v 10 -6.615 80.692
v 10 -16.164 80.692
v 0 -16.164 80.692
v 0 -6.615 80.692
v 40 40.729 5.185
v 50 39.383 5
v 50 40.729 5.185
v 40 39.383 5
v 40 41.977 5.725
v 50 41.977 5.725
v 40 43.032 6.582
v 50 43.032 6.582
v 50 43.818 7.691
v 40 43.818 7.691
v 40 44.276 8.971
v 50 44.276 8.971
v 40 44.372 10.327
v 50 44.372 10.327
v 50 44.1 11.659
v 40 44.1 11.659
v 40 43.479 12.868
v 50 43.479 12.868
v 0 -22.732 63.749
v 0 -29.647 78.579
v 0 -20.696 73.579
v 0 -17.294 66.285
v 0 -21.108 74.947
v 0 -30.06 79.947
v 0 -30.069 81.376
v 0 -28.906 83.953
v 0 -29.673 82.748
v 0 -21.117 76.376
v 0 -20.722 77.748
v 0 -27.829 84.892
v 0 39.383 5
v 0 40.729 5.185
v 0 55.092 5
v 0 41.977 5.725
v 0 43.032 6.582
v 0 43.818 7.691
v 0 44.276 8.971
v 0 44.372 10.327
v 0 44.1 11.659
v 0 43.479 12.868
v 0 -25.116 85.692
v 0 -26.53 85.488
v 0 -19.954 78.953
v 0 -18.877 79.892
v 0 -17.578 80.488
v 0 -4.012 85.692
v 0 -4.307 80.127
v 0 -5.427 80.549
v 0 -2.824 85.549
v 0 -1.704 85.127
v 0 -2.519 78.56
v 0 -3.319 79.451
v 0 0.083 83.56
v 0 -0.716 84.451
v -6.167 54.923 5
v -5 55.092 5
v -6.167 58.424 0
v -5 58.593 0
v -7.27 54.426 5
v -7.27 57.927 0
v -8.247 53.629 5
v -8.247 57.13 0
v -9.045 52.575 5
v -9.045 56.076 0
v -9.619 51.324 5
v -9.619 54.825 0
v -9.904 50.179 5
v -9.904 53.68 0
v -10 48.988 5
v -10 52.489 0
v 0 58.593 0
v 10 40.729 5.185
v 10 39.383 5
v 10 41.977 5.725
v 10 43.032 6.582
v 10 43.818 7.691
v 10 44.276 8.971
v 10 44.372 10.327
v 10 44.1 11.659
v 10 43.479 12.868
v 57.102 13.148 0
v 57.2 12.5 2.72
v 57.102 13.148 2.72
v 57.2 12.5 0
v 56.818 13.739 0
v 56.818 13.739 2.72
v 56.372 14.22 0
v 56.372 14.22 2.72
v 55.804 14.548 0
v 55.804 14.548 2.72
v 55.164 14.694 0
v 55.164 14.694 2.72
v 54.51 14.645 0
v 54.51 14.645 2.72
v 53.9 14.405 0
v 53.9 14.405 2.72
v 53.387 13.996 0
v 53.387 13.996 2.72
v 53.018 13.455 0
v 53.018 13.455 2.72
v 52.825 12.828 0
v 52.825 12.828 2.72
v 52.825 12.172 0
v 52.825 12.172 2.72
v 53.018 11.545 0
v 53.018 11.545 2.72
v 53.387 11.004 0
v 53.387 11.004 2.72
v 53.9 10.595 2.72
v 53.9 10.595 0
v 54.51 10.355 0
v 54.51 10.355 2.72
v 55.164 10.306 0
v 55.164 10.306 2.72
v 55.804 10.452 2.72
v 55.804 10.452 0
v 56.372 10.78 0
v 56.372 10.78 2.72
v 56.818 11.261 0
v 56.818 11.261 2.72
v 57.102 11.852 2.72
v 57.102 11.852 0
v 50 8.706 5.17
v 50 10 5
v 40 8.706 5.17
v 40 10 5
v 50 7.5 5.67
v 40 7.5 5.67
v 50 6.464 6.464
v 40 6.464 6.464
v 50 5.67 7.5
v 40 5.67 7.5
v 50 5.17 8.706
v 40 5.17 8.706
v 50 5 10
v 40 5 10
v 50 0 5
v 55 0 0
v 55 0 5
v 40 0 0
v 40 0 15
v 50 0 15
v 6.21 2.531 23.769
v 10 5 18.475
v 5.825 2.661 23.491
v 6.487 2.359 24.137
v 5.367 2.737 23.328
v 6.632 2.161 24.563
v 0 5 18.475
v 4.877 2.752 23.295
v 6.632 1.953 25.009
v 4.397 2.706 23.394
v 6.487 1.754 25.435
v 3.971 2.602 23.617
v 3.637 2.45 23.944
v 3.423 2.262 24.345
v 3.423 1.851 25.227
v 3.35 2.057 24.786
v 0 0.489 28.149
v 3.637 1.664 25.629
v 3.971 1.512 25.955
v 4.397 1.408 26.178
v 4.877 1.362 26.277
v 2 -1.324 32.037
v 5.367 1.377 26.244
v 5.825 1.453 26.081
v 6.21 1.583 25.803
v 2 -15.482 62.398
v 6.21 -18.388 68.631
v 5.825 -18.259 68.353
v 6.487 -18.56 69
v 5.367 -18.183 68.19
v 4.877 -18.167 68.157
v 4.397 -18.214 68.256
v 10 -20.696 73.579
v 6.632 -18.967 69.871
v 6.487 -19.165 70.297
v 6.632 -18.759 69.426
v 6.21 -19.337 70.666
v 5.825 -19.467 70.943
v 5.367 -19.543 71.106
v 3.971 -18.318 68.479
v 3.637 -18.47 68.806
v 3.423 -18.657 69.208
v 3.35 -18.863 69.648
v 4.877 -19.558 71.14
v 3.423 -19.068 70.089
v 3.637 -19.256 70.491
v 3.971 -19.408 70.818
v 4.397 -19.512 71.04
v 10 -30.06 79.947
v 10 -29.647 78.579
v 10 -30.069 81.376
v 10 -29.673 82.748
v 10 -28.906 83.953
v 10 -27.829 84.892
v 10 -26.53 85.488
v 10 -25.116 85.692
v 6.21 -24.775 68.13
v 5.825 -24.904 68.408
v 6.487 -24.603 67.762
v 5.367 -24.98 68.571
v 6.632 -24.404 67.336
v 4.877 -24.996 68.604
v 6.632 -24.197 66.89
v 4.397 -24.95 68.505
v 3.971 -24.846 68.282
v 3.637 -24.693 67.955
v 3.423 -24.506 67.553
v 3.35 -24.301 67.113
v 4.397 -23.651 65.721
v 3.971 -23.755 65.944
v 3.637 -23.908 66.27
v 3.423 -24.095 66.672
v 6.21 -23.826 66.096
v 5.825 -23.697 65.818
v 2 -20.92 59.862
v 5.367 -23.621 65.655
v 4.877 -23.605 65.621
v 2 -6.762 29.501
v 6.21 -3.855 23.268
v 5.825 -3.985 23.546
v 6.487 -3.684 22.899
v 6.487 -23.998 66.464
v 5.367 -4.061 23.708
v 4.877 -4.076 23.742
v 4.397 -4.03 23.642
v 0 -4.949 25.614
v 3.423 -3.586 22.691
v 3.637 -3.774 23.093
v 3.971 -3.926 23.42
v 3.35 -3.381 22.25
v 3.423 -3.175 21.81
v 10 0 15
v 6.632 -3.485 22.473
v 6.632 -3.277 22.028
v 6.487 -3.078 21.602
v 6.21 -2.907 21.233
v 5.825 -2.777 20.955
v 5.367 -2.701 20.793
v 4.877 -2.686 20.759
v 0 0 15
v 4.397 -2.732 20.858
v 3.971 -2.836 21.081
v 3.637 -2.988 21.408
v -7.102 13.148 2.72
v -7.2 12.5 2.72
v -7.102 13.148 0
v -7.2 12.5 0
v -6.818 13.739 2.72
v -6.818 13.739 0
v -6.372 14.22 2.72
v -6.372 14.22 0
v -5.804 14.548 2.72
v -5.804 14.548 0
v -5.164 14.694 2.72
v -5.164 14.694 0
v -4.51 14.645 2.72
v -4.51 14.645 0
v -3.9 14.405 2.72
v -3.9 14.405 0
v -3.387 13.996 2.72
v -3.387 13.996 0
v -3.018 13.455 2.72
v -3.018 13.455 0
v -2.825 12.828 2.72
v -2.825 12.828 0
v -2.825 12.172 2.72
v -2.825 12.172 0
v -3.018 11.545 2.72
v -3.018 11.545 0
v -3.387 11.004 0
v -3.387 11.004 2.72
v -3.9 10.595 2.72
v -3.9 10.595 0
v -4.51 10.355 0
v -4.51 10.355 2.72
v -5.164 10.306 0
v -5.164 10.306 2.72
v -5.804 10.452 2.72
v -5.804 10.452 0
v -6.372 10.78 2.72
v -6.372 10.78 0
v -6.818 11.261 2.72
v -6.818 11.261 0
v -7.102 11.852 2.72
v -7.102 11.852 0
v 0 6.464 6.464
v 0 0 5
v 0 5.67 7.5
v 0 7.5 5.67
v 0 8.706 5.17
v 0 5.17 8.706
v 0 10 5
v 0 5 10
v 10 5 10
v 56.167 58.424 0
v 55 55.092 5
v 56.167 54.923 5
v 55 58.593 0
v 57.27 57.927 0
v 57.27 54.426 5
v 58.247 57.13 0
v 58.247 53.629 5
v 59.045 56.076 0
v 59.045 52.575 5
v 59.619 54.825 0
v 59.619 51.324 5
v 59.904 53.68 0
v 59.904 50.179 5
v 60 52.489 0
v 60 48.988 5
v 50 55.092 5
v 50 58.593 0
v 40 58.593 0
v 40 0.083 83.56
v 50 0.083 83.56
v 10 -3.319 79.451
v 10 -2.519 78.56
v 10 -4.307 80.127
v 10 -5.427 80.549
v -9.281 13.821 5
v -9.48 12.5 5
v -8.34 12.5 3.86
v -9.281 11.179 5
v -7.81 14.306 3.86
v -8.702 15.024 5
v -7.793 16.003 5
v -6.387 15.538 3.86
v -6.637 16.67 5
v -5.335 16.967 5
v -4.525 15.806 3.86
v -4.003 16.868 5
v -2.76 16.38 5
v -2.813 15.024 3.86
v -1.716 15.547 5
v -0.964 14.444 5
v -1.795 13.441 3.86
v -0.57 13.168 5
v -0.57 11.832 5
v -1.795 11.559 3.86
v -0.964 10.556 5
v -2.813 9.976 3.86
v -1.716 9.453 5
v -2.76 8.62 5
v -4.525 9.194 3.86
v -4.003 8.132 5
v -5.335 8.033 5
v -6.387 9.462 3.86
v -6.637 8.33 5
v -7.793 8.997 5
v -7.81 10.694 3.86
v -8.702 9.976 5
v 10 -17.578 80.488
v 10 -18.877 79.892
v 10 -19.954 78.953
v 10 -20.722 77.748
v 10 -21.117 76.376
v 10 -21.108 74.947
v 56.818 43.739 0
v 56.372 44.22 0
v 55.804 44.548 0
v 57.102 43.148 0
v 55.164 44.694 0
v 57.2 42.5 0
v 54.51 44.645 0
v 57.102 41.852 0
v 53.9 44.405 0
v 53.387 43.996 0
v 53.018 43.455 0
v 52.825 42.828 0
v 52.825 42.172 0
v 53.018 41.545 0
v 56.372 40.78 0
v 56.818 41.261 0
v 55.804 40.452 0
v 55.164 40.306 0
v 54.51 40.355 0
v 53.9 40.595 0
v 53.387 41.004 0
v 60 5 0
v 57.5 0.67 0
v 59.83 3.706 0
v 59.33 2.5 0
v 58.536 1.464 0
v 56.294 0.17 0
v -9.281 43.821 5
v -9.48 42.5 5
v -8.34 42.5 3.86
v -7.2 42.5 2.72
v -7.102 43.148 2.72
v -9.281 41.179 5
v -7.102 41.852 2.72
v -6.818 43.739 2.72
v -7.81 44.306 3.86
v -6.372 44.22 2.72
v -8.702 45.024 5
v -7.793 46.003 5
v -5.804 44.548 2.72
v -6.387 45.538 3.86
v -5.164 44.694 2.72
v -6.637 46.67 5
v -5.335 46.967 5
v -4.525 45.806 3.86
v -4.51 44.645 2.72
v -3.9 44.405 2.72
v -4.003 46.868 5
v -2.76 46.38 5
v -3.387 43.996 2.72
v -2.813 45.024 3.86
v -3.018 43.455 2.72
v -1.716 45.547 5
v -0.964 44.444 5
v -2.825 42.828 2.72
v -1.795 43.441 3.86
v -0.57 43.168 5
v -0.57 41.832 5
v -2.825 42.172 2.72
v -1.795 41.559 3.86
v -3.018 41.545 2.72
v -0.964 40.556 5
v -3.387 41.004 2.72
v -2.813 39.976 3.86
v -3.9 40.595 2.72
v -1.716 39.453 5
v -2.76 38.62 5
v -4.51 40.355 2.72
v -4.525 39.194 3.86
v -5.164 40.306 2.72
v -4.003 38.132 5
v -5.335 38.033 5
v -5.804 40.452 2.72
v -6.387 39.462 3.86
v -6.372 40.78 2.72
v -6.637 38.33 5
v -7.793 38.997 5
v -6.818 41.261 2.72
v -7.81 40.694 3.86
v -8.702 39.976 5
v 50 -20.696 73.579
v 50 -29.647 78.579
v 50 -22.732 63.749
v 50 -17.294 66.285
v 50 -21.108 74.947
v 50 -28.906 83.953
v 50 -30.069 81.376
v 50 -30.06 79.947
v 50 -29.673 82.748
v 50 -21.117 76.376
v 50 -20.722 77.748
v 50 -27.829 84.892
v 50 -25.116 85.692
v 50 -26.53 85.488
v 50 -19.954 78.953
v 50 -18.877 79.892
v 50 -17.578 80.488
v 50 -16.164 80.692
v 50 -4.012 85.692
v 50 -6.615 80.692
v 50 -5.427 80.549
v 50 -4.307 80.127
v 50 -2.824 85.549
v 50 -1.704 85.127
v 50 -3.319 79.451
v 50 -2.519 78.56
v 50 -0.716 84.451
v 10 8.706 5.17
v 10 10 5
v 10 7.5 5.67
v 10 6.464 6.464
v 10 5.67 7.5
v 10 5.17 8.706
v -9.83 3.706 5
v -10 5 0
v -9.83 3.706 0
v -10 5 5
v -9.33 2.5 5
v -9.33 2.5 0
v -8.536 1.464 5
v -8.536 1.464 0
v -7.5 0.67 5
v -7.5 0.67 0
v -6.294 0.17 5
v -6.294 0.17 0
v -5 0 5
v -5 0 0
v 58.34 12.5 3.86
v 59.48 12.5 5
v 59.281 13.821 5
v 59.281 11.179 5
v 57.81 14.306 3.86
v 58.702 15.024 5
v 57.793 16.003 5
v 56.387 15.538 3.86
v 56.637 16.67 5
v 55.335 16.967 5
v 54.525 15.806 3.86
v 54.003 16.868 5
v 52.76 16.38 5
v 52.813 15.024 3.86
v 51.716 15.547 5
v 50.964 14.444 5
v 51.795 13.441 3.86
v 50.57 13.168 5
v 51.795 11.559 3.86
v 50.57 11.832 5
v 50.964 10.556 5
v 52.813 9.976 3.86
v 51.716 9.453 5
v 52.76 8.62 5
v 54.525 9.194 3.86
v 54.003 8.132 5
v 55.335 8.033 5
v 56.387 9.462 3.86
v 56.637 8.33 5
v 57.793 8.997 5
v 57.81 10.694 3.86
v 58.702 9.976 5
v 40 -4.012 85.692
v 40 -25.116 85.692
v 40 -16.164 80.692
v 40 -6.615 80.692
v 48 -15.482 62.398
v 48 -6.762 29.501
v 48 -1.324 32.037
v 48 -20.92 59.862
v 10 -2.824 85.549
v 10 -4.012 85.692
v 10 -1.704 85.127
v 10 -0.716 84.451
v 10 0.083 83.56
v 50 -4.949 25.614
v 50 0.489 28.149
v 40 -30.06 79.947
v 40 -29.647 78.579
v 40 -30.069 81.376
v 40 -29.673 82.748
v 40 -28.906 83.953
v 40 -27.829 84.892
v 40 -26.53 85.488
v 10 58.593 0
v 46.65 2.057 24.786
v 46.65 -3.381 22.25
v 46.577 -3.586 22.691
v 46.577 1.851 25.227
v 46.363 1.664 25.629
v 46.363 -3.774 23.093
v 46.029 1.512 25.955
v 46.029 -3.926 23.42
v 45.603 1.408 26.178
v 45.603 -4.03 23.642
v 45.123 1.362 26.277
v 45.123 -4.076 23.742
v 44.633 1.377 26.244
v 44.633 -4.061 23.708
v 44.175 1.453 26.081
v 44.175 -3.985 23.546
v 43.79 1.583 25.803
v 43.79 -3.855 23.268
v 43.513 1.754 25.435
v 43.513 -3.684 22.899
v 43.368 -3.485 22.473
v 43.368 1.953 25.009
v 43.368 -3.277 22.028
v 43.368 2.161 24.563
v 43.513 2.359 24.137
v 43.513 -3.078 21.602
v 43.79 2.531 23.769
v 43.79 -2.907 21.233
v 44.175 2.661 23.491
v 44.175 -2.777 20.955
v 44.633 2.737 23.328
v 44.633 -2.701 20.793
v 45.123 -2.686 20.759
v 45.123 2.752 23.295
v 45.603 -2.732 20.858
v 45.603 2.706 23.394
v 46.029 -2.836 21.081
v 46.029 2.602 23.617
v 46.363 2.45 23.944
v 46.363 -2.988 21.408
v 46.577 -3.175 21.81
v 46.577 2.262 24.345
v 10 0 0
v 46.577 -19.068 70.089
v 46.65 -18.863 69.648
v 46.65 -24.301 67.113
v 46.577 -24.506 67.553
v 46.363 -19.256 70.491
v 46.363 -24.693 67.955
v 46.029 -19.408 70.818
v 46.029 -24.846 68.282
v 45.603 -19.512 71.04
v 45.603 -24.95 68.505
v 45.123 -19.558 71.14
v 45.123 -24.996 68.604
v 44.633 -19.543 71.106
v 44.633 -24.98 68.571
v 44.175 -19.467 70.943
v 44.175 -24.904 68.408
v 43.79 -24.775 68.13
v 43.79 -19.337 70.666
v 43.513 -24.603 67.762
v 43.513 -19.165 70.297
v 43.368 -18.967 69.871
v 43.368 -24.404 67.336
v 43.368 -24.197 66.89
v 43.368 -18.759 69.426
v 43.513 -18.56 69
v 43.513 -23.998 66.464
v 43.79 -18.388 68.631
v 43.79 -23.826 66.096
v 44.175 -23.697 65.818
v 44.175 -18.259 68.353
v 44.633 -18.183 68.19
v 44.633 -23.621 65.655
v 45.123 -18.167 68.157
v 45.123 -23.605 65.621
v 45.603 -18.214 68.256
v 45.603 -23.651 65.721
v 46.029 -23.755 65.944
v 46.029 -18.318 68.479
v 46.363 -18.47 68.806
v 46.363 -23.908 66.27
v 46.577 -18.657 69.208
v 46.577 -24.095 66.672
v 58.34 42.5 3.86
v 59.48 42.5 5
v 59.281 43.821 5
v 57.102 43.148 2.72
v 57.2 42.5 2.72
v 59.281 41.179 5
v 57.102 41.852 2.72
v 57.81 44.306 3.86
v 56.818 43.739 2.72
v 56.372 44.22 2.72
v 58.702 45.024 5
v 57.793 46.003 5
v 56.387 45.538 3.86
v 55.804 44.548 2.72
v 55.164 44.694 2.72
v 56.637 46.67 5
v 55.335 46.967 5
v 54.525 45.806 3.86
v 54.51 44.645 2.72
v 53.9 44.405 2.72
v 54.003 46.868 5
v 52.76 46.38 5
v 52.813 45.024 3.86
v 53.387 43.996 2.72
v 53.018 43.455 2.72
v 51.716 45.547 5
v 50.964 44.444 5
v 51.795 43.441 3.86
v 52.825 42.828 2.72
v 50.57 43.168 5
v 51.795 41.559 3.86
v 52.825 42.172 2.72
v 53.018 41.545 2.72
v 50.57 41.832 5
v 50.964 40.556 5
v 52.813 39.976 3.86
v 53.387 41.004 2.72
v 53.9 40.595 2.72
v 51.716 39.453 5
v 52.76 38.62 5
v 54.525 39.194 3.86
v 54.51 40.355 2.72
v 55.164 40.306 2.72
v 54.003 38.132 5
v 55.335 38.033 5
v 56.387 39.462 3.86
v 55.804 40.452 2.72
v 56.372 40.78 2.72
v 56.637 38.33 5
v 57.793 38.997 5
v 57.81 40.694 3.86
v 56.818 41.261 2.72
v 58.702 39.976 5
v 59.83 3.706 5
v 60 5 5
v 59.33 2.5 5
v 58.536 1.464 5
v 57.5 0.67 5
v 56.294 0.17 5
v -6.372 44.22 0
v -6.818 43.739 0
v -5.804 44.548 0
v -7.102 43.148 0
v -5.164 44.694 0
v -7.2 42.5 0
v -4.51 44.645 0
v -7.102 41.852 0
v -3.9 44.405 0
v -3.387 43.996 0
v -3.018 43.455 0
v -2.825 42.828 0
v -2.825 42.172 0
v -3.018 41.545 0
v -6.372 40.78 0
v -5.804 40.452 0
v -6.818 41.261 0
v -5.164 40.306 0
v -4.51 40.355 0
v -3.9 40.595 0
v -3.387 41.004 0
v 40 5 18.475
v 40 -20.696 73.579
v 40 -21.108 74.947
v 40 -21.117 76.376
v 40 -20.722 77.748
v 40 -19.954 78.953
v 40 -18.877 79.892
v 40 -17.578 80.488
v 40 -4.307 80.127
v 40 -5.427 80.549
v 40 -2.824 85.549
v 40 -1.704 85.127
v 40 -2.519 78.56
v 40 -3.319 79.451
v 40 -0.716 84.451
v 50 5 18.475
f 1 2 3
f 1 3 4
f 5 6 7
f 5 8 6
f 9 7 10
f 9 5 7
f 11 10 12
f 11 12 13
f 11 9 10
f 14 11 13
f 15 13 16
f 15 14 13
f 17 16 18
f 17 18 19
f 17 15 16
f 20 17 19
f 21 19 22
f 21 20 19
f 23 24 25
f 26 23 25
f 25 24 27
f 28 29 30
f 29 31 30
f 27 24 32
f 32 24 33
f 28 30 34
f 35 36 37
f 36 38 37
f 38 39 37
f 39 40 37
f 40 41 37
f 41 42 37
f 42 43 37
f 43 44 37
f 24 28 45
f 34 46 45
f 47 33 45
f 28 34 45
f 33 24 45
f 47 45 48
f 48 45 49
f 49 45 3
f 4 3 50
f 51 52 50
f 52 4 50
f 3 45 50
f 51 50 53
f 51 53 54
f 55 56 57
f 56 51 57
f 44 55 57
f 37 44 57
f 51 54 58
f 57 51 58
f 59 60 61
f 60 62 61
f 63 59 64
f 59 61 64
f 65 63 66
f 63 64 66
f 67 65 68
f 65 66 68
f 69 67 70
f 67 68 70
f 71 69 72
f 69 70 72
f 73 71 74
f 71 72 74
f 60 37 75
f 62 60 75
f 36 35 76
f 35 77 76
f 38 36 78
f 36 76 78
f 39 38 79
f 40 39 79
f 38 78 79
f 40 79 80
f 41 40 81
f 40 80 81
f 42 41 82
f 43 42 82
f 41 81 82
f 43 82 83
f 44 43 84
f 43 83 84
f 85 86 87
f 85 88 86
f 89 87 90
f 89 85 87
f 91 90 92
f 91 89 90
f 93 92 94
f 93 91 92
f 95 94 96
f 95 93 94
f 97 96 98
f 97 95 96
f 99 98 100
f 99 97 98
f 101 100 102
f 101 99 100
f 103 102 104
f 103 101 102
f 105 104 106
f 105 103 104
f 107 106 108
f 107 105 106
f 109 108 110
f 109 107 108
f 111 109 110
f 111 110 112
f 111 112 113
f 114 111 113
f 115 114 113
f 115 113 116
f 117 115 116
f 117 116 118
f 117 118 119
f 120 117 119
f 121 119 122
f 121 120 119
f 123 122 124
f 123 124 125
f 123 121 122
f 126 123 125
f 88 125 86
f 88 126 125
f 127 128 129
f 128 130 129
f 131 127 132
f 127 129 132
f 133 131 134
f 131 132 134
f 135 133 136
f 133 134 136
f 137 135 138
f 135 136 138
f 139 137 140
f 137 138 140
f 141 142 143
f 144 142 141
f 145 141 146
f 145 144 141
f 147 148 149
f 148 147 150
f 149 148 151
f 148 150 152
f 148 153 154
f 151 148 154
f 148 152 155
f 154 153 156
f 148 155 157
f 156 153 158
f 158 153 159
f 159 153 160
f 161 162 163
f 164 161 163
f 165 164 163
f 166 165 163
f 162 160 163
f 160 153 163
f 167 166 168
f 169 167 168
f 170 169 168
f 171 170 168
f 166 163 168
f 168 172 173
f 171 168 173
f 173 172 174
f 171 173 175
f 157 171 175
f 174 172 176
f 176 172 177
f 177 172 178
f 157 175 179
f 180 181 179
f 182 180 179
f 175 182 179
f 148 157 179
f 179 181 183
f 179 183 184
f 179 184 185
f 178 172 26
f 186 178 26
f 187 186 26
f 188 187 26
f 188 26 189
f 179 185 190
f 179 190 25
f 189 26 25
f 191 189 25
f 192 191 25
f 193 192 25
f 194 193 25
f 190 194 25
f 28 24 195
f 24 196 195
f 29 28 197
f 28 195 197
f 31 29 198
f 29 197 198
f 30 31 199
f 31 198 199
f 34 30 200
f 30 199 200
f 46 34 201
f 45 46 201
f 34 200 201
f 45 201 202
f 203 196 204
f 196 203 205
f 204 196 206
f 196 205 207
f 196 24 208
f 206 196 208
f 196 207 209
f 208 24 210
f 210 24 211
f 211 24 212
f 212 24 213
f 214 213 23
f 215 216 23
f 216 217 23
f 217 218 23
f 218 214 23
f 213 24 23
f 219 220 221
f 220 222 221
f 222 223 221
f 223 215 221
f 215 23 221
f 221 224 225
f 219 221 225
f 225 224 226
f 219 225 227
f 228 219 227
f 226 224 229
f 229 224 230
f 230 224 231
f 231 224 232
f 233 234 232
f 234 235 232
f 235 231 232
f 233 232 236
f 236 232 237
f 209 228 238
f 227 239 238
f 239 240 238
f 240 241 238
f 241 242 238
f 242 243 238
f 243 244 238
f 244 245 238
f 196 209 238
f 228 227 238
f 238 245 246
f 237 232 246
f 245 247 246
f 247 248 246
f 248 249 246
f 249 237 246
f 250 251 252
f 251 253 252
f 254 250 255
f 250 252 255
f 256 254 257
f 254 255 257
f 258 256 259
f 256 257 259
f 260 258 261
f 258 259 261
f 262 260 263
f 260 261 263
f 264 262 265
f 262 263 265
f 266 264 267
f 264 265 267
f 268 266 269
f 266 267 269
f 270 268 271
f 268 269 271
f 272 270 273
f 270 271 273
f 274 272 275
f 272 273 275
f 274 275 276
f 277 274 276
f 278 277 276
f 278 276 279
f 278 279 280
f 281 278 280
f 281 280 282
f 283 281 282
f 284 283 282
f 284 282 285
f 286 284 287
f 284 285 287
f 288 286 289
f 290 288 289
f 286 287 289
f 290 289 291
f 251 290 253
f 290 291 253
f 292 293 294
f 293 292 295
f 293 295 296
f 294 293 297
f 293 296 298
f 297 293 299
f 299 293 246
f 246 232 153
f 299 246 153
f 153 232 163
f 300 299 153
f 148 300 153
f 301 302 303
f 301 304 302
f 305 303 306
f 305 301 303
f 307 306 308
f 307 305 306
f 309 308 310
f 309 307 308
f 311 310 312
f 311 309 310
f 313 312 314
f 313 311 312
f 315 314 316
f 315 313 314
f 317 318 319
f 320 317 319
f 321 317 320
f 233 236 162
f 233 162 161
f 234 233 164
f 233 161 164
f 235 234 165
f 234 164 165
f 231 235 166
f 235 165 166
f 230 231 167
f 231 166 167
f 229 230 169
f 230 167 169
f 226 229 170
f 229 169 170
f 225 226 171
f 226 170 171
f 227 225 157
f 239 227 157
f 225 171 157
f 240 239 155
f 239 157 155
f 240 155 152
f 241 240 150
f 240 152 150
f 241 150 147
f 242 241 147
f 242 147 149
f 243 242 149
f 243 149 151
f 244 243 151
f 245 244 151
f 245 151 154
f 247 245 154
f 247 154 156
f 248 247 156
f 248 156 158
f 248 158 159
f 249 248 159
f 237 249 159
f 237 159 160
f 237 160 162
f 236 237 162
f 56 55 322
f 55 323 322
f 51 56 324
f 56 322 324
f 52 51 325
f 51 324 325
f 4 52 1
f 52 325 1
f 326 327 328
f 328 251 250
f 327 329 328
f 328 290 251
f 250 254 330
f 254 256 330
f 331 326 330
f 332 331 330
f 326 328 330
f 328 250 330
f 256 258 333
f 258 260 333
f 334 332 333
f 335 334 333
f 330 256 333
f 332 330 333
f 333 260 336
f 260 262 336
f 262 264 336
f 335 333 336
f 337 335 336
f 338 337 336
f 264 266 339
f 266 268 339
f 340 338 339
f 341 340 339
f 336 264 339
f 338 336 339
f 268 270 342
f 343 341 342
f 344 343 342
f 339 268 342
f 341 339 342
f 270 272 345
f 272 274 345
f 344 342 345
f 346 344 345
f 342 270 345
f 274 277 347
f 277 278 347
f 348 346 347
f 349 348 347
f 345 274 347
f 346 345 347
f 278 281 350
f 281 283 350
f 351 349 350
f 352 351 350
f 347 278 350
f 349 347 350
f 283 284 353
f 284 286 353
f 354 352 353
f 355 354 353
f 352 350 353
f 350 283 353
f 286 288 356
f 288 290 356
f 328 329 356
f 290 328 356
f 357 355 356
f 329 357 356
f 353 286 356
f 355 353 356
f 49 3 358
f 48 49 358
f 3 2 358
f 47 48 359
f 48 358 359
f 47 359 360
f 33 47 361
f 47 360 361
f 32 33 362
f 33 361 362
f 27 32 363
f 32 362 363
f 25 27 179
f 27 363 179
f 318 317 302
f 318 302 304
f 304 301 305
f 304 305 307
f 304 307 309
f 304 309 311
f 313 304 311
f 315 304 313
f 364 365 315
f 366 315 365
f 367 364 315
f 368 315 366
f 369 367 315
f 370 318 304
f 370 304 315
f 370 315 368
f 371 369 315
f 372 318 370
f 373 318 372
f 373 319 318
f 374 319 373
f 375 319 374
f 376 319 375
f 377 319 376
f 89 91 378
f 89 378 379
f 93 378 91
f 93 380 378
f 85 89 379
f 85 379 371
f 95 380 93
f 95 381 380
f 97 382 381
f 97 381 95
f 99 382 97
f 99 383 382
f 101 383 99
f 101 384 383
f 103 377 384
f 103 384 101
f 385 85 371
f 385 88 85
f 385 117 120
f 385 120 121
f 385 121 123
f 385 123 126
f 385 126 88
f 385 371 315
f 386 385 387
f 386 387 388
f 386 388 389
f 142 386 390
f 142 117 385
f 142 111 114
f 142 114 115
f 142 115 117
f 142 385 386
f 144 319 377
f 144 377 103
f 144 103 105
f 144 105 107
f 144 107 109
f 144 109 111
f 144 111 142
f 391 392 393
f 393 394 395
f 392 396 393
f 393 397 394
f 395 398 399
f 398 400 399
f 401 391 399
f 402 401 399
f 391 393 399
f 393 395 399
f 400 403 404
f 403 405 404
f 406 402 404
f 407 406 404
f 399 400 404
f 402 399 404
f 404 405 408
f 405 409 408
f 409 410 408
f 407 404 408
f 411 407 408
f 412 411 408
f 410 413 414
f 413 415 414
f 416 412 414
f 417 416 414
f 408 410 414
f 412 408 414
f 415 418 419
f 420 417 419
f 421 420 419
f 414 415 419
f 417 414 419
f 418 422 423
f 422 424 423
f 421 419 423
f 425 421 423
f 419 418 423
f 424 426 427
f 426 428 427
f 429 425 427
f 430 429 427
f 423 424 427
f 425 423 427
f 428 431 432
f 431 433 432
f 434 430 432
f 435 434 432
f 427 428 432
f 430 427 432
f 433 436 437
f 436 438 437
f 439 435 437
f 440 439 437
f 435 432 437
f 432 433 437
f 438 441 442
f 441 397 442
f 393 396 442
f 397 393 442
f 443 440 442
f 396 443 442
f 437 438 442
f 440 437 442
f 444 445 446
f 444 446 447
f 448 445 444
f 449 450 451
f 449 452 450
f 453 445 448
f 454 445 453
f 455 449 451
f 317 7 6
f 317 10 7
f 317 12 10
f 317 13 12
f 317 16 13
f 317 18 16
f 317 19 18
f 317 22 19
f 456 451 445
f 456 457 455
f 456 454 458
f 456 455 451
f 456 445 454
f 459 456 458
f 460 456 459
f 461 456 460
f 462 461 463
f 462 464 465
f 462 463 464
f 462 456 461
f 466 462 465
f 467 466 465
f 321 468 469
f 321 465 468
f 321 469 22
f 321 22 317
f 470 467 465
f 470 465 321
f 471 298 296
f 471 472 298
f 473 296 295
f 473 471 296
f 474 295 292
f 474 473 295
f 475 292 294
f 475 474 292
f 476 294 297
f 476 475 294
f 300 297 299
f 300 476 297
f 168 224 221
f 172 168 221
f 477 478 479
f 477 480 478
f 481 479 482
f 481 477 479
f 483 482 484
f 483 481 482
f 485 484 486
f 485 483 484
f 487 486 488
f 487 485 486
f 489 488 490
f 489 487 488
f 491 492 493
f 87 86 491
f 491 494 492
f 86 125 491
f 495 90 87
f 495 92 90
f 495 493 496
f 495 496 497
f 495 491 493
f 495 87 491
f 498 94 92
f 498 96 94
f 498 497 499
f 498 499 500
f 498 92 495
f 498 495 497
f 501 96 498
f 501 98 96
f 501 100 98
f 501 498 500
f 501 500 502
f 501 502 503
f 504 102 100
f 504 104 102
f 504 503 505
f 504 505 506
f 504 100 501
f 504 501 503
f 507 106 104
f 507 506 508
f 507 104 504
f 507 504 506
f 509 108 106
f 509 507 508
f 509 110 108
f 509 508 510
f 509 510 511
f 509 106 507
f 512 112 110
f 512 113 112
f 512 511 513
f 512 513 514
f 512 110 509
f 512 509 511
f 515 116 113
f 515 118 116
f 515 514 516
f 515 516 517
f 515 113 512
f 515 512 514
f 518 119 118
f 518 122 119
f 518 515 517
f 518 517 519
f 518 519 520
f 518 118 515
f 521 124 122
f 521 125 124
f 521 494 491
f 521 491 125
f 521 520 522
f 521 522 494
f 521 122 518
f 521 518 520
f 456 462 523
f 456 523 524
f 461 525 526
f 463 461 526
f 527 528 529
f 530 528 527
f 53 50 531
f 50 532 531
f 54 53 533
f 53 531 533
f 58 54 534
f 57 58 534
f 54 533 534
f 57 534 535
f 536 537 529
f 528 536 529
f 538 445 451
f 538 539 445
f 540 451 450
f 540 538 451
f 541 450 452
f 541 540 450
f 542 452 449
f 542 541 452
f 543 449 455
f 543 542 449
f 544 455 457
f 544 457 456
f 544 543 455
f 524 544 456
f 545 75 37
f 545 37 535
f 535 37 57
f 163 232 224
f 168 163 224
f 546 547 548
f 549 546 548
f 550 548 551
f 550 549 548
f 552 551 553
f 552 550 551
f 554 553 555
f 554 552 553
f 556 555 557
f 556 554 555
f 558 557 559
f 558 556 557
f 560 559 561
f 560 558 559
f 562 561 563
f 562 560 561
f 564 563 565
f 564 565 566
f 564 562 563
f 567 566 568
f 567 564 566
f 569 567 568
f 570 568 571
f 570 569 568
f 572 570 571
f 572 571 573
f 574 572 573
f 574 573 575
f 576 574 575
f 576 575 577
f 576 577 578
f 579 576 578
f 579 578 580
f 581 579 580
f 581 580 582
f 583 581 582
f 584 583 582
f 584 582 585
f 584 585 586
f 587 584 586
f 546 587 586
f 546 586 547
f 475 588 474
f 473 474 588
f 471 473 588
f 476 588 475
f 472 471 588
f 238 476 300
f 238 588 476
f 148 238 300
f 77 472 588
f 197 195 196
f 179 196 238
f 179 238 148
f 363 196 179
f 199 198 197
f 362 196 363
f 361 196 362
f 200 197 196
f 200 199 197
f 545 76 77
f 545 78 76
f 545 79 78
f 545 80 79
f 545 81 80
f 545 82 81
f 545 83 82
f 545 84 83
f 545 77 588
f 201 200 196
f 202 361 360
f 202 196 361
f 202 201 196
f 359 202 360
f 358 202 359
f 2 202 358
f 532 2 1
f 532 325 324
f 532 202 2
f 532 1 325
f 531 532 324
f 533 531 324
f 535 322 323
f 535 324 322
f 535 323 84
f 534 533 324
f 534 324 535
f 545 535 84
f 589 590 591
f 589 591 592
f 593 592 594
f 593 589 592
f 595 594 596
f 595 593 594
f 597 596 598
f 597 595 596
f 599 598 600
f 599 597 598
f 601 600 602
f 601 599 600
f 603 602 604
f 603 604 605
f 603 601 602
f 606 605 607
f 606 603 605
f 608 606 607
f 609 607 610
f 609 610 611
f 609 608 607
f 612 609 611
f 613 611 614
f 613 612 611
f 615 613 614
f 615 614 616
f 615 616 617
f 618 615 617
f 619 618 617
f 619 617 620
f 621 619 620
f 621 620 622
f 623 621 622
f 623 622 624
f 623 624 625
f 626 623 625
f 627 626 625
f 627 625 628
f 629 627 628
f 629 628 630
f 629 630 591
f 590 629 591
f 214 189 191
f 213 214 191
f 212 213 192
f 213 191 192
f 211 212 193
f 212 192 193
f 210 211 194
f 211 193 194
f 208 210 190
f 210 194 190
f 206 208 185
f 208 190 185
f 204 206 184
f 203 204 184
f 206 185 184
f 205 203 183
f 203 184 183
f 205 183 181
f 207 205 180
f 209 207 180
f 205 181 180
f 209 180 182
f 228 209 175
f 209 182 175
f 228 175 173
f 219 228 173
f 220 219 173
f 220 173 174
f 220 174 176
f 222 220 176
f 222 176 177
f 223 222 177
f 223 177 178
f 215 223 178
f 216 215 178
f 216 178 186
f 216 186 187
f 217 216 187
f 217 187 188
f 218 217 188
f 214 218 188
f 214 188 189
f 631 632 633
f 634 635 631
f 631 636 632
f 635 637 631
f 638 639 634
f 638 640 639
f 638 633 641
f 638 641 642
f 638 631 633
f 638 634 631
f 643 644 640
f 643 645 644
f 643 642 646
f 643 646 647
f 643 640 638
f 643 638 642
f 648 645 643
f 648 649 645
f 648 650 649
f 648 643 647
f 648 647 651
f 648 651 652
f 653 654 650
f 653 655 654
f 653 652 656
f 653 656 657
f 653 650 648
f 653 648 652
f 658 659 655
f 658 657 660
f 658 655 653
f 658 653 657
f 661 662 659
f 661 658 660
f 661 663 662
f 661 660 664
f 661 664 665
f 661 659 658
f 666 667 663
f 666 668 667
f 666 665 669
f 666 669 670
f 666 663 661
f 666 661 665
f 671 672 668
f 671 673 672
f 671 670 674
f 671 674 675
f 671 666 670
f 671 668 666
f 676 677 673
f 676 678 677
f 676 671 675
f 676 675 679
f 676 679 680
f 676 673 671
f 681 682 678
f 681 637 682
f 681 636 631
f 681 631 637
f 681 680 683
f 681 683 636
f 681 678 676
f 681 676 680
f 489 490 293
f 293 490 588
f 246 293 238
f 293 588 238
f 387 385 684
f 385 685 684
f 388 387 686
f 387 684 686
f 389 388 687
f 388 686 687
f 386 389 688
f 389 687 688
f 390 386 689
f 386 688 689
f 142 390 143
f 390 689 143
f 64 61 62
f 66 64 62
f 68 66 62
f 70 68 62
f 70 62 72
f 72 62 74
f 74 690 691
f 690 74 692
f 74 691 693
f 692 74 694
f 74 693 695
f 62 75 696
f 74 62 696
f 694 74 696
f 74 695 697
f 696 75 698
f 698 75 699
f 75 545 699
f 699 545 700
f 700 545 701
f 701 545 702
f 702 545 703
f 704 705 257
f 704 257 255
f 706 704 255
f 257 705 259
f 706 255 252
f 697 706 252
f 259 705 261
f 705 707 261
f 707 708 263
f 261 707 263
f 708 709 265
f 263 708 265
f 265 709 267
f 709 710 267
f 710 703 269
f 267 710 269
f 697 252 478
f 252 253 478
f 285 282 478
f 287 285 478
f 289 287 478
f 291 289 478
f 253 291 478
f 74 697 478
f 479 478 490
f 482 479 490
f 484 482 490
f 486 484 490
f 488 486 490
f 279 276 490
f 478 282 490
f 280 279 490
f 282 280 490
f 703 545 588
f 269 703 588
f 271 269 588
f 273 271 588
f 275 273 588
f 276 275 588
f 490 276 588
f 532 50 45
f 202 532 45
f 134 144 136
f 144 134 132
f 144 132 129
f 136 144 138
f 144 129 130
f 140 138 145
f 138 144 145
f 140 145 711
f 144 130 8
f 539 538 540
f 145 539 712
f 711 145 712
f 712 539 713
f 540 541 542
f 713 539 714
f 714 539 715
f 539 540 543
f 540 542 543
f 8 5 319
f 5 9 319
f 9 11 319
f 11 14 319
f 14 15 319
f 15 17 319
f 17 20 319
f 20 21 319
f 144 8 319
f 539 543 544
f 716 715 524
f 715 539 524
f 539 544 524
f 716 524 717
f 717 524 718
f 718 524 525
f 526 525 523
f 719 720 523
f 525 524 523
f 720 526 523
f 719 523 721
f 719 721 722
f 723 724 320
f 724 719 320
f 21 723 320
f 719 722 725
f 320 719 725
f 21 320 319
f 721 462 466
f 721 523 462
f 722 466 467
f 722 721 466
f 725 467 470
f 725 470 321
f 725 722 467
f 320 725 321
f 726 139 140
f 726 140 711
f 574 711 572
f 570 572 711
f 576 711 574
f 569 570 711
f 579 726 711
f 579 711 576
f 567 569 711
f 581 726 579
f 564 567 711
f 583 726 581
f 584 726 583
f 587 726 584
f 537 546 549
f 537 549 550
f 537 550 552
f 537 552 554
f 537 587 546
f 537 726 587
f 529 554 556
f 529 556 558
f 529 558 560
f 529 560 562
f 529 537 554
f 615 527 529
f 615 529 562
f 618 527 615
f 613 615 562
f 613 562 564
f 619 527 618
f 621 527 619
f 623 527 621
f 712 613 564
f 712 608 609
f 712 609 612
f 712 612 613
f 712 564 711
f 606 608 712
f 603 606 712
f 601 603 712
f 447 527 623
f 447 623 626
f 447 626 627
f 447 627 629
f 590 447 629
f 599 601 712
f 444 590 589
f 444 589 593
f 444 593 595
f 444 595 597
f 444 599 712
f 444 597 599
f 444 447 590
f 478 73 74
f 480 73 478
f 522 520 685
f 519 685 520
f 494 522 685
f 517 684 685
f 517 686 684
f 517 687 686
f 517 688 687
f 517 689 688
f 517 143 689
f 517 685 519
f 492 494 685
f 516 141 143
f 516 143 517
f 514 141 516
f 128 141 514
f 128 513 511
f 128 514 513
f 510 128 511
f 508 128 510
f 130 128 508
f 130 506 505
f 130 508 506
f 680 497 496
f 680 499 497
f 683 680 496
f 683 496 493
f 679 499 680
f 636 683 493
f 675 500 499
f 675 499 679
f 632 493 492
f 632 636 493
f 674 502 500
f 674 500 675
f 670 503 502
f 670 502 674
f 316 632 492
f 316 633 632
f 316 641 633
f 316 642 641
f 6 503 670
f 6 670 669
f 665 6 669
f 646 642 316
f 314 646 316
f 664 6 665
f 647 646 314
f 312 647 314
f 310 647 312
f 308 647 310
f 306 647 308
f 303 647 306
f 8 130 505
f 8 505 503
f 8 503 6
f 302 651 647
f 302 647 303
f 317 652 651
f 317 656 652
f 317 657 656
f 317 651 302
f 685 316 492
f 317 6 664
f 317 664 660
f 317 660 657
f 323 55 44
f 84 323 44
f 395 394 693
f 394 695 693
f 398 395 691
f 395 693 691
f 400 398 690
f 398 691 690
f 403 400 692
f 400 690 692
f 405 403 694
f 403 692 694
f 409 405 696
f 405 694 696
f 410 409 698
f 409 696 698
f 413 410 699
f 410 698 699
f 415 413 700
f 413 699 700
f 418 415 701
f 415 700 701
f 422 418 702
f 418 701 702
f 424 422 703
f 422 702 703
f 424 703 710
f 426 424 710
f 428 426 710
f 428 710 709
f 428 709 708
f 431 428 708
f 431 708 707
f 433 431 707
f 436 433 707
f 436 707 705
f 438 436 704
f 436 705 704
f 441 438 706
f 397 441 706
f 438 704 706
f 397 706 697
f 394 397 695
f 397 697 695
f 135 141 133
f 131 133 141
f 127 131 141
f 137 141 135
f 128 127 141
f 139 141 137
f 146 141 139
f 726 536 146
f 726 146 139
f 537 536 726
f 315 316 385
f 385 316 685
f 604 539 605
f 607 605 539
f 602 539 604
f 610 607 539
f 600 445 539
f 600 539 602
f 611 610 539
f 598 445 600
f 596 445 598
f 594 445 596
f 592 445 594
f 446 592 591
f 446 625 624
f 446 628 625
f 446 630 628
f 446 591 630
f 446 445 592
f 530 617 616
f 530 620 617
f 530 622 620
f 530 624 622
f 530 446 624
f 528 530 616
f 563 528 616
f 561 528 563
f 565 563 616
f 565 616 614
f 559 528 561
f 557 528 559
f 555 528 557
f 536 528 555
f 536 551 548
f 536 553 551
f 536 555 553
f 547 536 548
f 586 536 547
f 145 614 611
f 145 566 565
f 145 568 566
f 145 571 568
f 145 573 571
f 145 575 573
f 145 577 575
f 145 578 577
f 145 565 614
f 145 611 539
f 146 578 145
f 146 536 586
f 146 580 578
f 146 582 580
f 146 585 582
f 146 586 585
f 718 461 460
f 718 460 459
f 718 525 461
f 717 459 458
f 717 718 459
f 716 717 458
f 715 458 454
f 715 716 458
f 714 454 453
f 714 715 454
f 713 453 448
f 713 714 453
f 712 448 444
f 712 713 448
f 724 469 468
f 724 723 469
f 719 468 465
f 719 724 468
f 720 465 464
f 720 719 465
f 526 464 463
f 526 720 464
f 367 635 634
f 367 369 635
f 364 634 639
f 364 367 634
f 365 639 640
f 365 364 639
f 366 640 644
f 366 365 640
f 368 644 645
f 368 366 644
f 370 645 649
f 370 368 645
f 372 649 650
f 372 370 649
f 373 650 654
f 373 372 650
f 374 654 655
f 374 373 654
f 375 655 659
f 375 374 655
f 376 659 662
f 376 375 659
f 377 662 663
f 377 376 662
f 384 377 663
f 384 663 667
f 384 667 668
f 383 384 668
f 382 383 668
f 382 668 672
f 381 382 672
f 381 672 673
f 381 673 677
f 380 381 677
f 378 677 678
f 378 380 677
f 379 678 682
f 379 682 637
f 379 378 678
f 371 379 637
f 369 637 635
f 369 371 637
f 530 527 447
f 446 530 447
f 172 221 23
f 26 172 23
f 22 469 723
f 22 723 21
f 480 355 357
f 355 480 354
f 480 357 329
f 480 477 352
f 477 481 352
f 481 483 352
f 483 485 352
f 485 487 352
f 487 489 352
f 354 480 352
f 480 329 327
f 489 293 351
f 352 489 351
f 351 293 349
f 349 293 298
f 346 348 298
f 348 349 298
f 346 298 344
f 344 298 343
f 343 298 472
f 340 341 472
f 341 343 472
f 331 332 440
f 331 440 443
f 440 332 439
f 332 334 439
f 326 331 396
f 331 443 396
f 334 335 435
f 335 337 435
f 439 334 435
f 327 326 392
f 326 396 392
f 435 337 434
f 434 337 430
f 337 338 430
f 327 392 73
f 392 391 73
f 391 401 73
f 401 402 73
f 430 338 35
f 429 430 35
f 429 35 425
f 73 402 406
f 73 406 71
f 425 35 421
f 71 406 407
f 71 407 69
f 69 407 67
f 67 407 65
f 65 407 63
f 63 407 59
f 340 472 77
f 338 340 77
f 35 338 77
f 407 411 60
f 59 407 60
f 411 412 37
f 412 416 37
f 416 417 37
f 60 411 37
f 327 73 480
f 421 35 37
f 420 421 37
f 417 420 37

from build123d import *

# Parameters (mm, degrees)
F1_DEPTH        = 10
F3_DEPTH        = 10
F4_R            = 5
F6_D            = 3.3
F6_DEPTH        = 10
F6_TIP          = 0.9914200214
F8_R            = 5
F10_DEPTH       = 6
F13_D           = 4.4
F13_DEPTH       = 10
F13_CSINK_D     = 8.96
F13_CSINK_ANGLE = 90
F13_TIP         = 1.3218933619


with BuildPart() as f1:
    # F0 (on Right) → F1 (new body)
    with BuildSketch(Plane.YZ):
        Polygon((0, 15), (0, 0), (58.5926061795, 0), (-1.4095833585, 85.6920073889), (-32.9642244158, 85.6920073889), align=None)
        Polygon((-4.0124186112, 80.6920073889), (48.9876955447, 5), (5, 5), (5, 18.4746748964), (-24.0124186112, 80.6920073889), align=None, mode=Mode.SUBTRACT)
    extrude(amount=F1_DEPTH)

    # F2 (on face) → F3 (join)
    with BuildSketch(Plane(origin=(0, 0, 0), x_dir=(0, -1, 0), z_dir=(-1, 0, 0))):
        Polygon((-48.9876955447, 5), (-55.0915684885, 5), (-58.5926061795, 0), (0, 0), (0, 5), (-5, 5), align=None)
    extrude(amount=F3_DEPTH)

    # F4
    f4_edges = [f1.edges().sort_by_distance(p)[0] for p in [
        (-10, 56.842087, 2.5),
        (-10, 0, 2.5),
        (5, -1.409583, 85.692007),
    ]]
    fillet(f4_edges, radius=F4_R)

    # F6
    with Locations(Plane(origin=(0, 5.7453333234, 2.6790929274), x_dir=(1, 0, 0), z_dir=(0, -0.906307787, -0.4226182617))):
        with Locations((5, 71.0946168055), (5, 21.5946168055)):
            Hole(F6_D / 2, depth=F6_DEPTH)
            with Locations((0, 0, -(F6_DEPTH + F6_TIP / 2))):  # 118° drill point
                Cone(0, F6_D / 2, F6_TIP, mode=Mode.SUBTRACT)

    # F8
    f8_edges = [f1.edges().sort_by_distance(p)[0] for p in [
        (5, -32.964224, 85.692007),
        (5, -24.012419, 80.692007),
        (5, -4.012419, 80.692007),
        (5, 5, 5),
        (5, 48.987696, 5),
    ]]
    fillet(f8_edges, radius=F8_R)

    # F9 (on face) → F10 (cut, through all)
    with BuildSketch(Plane(origin=(0, 5.7453333234, 2.6790929274), x_dir=(1, 0, 0), z_dir=(0, -0.906307787, -0.4226182617))):
        Polygon((2, 29.5946168055), (2, 63.0946168055), (0, 67.3836306466), (0, 25.3056029645), align=None)
    extrude(amount=-F10_DEPTH, mode=Mode.SUBTRACT)

    # F13
    with Locations(Plane.XY.offset(5)):
        with Locations((-5, 42.5), (-5, 12.5)):
            CounterSinkHole(F13_D / 2, F13_CSINK_D / 2, depth=F13_DEPTH, counter_sink_angle=F13_CSINK_ANGLE)
            with Locations((0, 0, -(F13_DEPTH + F13_TIP / 2))):  # 118° drill point
                Cone(0, F13_D / 2, F13_TIP, mode=Mode.SUBTRACT)


with BuildPart() as f14_1:
    # F14: instance of F1
    add(f1.part.mirror(Plane(origin=(25, 9.4244202905, 39.0277979047), x_dir=(0, 1, 0), z_dir=(1, 0, 0))))


solid = Compound([f1.part, f14_1.part])
